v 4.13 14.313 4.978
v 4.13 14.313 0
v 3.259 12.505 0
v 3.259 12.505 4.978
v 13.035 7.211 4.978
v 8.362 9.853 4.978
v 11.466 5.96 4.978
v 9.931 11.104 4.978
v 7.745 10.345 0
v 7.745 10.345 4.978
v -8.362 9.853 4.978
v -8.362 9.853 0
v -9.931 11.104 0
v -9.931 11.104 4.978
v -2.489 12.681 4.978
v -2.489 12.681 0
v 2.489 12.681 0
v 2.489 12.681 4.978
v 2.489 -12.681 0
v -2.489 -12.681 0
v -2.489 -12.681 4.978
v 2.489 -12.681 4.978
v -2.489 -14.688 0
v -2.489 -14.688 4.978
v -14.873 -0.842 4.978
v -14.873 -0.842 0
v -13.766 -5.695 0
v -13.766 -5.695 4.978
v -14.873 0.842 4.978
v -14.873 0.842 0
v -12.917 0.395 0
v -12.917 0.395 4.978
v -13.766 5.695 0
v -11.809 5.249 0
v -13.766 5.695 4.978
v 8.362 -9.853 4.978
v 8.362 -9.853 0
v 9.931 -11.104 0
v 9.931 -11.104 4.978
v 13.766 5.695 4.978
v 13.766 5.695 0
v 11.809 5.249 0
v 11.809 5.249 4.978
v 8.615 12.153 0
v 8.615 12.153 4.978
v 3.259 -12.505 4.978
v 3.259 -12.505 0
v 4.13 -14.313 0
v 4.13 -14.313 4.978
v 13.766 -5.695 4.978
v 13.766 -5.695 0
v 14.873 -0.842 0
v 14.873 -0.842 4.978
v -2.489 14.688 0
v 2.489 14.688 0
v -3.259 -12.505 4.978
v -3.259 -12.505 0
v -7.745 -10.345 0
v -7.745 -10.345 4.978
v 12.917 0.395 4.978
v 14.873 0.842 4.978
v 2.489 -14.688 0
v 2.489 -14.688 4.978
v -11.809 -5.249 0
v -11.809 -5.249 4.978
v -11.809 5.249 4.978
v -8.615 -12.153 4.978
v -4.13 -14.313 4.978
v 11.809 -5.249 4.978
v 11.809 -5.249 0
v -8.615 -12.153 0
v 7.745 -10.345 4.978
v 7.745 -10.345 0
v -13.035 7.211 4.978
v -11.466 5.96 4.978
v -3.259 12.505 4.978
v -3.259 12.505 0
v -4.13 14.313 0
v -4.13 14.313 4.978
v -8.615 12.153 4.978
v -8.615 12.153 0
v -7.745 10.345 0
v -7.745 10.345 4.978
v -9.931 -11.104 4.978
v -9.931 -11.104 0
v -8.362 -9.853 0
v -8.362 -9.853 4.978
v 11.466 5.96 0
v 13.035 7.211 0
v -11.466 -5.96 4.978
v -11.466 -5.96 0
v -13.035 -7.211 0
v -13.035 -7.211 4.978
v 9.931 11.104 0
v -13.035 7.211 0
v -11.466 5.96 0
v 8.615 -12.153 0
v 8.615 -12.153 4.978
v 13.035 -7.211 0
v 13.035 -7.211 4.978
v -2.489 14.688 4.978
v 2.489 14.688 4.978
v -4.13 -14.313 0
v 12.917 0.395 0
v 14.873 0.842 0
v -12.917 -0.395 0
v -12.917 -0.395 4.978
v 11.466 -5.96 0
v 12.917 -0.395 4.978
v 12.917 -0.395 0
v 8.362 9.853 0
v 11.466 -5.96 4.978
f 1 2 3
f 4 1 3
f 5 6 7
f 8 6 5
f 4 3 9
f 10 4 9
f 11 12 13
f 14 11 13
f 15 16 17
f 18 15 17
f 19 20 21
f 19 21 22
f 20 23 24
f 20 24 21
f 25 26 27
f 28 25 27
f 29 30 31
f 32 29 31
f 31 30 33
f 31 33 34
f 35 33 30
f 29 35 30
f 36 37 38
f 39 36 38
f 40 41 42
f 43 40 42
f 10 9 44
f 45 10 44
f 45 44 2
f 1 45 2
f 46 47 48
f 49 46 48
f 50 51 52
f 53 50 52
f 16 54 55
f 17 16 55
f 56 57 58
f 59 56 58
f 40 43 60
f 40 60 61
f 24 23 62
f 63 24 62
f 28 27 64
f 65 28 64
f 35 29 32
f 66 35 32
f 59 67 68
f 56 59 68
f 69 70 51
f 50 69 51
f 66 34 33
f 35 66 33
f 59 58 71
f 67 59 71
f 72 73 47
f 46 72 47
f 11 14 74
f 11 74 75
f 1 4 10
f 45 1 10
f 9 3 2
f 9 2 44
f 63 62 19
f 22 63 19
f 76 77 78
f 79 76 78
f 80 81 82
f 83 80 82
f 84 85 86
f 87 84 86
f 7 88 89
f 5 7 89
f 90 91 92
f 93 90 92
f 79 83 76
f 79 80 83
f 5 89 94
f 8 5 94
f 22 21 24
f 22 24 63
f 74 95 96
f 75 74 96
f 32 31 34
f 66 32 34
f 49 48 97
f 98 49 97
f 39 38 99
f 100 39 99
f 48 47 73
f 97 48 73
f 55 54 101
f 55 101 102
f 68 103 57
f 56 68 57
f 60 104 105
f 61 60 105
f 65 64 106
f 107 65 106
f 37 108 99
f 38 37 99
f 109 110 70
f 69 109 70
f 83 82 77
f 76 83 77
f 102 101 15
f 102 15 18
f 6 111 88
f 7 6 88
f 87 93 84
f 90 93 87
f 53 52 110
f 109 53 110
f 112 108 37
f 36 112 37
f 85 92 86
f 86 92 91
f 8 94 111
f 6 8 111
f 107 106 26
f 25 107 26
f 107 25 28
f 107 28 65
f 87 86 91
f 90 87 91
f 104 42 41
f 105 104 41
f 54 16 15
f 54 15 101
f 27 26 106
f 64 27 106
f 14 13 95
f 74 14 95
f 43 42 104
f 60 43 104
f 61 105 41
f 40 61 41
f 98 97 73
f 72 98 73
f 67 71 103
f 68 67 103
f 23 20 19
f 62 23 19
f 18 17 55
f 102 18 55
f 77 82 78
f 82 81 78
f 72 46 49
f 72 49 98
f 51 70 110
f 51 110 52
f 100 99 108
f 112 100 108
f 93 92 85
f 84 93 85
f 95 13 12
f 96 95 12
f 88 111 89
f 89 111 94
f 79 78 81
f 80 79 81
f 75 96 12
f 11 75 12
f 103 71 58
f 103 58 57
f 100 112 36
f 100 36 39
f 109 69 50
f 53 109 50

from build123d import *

# Parameters (mm, degrees)
EXTRUDE3_DEPTH    = 4.9784
SKETCH1_W         = 4.9784
SKETCH1_H         = 2.0066
EXTRUDE3_2_DEPTH  = 4.9784
EXTRUDE3_3_DEPTH  = 4.9784
EXTRUDE3_4_DEPTH  = 4.9784
EXTRUDE3_5_DEPTH  = 4.9784
EXTRUDE3_6_DEPTH  = 4.9784
EXTRUDE3_7_DEPTH  = 4.9784
EXTRUDE3_8_DEPTH  = 4.9784
EXTRUDE3_9_DEPTH  = 4.9784
EXTRUDE3_10_DEPTH = 4.9784
EXTRUDE3_11_DEPTH = 4.9784
EXTRUDE3_12_DEPTH = 4.9784
EXTRUDE3_13_DEPTH = 4.9784
EXTRUDE3_14_DEPTH = 4.9784


with BuildPart() as part:
    # Sketch1 → Extrude3 (new body)
    with BuildSketch(Plane.XY):
        Polygon((3.259415729, 12.505267218), (7.744799141, 10.345220411), (8.615430252, 12.153104541), (4.13004684, 14.313151348), align=None)
    extrude(amount=EXTRUDE3_DEPTH)


with BuildPart() as body_2:
    # Sketch1 → Extrude3 2 (new body)
    with BuildSketch(Plane.XY):
        with Locations((0, 13.684363932)):
            Rectangle(SKETCH1_W, SKETCH1_H)
    extrude(amount=EXTRUDE3_2_DEPTH)


with BuildPart() as body_3:
    # Sketch1 → Extrude3 3 (new body)
    with BuildSketch(Plane.XY):
        Polygon((8.362464198, 9.852648964), (11.466445828, 5.960379112), (13.03526888, 7.211473748), (9.931287251, 11.103743601), align=None)
    extrude(amount=EXTRUDE3_3_DEPTH)


with BuildPart() as body_4:
    # Sketch1 → Extrude3 4 (new body)
    with BuildSketch(Plane.XY):
        Polygon((11.809224074, 5.248592749), (12.917022292, 0.395011631), (14.873312641, 0.841522137), (13.765514423, 5.695103255), align=None)
    extrude(amount=EXTRUDE3_4_DEPTH)


with BuildPart() as body_5:
    # Sketch1 → Extrude3 5 (new body)
    with BuildSketch(Plane.XY):
        Polygon((12.917022292, -0.395011631), (11.809224074, -5.248592749), (13.765514423, -5.695103255), (14.873312641, -0.841522137), align=None)
    extrude(amount=EXTRUDE3_5_DEPTH)


with BuildPart() as body_6:
    # Sketch1 → Extrude3 6 (new body)
    with BuildSketch(Plane.XY):
        Polygon((11.466445828, -5.960379112), (8.362464198, -9.852648964), (9.931287251, -11.103743601), (13.03526888, -7.211473748), align=None)
    extrude(amount=EXTRUDE3_6_DEPTH)


with BuildPart() as body_7:
    # Sketch1 → Extrude3 7 (new body)
    with BuildSketch(Plane.XY):
        Polygon((7.744799141, -10.345220411), (3.259415729, -12.505267218), (4.13004684, -14.313151348), (8.615430252, -12.153104541), align=None)
    extrude(amount=EXTRUDE3_7_DEPTH)


with BuildPart() as body_8:
    # Sketch1 → Extrude3 8 (new body)
    with BuildSketch(Plane.XY):
        with Locations((0, -13.684363932)):
            Rectangle(SKETCH1_W, SKETCH1_H)
    extrude(amount=EXTRUDE3_8_DEPTH)


with BuildPart() as body_9:
    # Sketch1 → Extrude3 9 (new body)
    with BuildSketch(Plane.XY):
        Polygon((-3.259415729, -12.505267218), (-7.744799141, -10.345220411), (-8.615430252, -12.153104541), (-4.13004684, -14.313151348), align=None)
    extrude(amount=EXTRUDE3_9_DEPTH)


with BuildPart() as body_10:
    # Sketch1 → Extrude3 10 (new body)
    with BuildSketch(Plane.XY):
        Polygon((-8.362464198, -9.852648964), (-11.466445828, -5.960379112), (-13.03526888, -7.211473748), (-9.931287251, -11.103743601), align=None)
    extrude(amount=EXTRUDE3_10_DEPTH)


with BuildPart() as body_11:
    # Sketch1 → Extrude3 11 (new body)
    with BuildSketch(Plane.XY):
        Polygon((-11.809224074, -5.248592749), (-12.917022292, -0.395011631), (-14.873312641, -0.841522137), (-13.765514423, -5.695103255), align=None)
    extrude(amount=EXTRUDE3_11_DEPTH)


with BuildPart() as body_12:
    # Sketch1 → Extrude3 12 (new body)
    with BuildSketch(Plane.XY):
        Polygon((-12.917022292, 0.395011631), (-11.809224074, 5.248592749), (-13.765514423, 5.695103255), (-14.873312641, 0.841522137), align=None)
    extrude(amount=EXTRUDE3_12_DEPTH)


with BuildPart() as body_13:
    # Sketch1 → Extrude3 13 (new body)
    with BuildSketch(Plane.XY):
        Polygon((-11.466445828, 5.960379112), (-8.362464198, 9.852648964), (-9.931287251, 11.103743601), (-13.03526888, 7.211473748), align=None)
    extrude(amount=EXTRUDE3_13_DEPTH)


with BuildPart() as body_14:
    # Sketch1 → Extrude3 14 (new body)
    with BuildSketch(Plane.XY):
        Polygon((-7.744799141, 10.345220411), (-3.259415729, 12.505267218), (-4.13004684, 14.313151348), (-8.615430252, 12.153104541), align=None)
    extrude(amount=EXTRUDE3_14_DEPTH)


solid = Compound([part.part, body_2.part, body_3.part, body_4.part, body_5.part, body_6.part, body_7.part, body_8.part, body_9.part, body_10.part, body_11.part, body_12.part, body_13.part, body_14.part])
